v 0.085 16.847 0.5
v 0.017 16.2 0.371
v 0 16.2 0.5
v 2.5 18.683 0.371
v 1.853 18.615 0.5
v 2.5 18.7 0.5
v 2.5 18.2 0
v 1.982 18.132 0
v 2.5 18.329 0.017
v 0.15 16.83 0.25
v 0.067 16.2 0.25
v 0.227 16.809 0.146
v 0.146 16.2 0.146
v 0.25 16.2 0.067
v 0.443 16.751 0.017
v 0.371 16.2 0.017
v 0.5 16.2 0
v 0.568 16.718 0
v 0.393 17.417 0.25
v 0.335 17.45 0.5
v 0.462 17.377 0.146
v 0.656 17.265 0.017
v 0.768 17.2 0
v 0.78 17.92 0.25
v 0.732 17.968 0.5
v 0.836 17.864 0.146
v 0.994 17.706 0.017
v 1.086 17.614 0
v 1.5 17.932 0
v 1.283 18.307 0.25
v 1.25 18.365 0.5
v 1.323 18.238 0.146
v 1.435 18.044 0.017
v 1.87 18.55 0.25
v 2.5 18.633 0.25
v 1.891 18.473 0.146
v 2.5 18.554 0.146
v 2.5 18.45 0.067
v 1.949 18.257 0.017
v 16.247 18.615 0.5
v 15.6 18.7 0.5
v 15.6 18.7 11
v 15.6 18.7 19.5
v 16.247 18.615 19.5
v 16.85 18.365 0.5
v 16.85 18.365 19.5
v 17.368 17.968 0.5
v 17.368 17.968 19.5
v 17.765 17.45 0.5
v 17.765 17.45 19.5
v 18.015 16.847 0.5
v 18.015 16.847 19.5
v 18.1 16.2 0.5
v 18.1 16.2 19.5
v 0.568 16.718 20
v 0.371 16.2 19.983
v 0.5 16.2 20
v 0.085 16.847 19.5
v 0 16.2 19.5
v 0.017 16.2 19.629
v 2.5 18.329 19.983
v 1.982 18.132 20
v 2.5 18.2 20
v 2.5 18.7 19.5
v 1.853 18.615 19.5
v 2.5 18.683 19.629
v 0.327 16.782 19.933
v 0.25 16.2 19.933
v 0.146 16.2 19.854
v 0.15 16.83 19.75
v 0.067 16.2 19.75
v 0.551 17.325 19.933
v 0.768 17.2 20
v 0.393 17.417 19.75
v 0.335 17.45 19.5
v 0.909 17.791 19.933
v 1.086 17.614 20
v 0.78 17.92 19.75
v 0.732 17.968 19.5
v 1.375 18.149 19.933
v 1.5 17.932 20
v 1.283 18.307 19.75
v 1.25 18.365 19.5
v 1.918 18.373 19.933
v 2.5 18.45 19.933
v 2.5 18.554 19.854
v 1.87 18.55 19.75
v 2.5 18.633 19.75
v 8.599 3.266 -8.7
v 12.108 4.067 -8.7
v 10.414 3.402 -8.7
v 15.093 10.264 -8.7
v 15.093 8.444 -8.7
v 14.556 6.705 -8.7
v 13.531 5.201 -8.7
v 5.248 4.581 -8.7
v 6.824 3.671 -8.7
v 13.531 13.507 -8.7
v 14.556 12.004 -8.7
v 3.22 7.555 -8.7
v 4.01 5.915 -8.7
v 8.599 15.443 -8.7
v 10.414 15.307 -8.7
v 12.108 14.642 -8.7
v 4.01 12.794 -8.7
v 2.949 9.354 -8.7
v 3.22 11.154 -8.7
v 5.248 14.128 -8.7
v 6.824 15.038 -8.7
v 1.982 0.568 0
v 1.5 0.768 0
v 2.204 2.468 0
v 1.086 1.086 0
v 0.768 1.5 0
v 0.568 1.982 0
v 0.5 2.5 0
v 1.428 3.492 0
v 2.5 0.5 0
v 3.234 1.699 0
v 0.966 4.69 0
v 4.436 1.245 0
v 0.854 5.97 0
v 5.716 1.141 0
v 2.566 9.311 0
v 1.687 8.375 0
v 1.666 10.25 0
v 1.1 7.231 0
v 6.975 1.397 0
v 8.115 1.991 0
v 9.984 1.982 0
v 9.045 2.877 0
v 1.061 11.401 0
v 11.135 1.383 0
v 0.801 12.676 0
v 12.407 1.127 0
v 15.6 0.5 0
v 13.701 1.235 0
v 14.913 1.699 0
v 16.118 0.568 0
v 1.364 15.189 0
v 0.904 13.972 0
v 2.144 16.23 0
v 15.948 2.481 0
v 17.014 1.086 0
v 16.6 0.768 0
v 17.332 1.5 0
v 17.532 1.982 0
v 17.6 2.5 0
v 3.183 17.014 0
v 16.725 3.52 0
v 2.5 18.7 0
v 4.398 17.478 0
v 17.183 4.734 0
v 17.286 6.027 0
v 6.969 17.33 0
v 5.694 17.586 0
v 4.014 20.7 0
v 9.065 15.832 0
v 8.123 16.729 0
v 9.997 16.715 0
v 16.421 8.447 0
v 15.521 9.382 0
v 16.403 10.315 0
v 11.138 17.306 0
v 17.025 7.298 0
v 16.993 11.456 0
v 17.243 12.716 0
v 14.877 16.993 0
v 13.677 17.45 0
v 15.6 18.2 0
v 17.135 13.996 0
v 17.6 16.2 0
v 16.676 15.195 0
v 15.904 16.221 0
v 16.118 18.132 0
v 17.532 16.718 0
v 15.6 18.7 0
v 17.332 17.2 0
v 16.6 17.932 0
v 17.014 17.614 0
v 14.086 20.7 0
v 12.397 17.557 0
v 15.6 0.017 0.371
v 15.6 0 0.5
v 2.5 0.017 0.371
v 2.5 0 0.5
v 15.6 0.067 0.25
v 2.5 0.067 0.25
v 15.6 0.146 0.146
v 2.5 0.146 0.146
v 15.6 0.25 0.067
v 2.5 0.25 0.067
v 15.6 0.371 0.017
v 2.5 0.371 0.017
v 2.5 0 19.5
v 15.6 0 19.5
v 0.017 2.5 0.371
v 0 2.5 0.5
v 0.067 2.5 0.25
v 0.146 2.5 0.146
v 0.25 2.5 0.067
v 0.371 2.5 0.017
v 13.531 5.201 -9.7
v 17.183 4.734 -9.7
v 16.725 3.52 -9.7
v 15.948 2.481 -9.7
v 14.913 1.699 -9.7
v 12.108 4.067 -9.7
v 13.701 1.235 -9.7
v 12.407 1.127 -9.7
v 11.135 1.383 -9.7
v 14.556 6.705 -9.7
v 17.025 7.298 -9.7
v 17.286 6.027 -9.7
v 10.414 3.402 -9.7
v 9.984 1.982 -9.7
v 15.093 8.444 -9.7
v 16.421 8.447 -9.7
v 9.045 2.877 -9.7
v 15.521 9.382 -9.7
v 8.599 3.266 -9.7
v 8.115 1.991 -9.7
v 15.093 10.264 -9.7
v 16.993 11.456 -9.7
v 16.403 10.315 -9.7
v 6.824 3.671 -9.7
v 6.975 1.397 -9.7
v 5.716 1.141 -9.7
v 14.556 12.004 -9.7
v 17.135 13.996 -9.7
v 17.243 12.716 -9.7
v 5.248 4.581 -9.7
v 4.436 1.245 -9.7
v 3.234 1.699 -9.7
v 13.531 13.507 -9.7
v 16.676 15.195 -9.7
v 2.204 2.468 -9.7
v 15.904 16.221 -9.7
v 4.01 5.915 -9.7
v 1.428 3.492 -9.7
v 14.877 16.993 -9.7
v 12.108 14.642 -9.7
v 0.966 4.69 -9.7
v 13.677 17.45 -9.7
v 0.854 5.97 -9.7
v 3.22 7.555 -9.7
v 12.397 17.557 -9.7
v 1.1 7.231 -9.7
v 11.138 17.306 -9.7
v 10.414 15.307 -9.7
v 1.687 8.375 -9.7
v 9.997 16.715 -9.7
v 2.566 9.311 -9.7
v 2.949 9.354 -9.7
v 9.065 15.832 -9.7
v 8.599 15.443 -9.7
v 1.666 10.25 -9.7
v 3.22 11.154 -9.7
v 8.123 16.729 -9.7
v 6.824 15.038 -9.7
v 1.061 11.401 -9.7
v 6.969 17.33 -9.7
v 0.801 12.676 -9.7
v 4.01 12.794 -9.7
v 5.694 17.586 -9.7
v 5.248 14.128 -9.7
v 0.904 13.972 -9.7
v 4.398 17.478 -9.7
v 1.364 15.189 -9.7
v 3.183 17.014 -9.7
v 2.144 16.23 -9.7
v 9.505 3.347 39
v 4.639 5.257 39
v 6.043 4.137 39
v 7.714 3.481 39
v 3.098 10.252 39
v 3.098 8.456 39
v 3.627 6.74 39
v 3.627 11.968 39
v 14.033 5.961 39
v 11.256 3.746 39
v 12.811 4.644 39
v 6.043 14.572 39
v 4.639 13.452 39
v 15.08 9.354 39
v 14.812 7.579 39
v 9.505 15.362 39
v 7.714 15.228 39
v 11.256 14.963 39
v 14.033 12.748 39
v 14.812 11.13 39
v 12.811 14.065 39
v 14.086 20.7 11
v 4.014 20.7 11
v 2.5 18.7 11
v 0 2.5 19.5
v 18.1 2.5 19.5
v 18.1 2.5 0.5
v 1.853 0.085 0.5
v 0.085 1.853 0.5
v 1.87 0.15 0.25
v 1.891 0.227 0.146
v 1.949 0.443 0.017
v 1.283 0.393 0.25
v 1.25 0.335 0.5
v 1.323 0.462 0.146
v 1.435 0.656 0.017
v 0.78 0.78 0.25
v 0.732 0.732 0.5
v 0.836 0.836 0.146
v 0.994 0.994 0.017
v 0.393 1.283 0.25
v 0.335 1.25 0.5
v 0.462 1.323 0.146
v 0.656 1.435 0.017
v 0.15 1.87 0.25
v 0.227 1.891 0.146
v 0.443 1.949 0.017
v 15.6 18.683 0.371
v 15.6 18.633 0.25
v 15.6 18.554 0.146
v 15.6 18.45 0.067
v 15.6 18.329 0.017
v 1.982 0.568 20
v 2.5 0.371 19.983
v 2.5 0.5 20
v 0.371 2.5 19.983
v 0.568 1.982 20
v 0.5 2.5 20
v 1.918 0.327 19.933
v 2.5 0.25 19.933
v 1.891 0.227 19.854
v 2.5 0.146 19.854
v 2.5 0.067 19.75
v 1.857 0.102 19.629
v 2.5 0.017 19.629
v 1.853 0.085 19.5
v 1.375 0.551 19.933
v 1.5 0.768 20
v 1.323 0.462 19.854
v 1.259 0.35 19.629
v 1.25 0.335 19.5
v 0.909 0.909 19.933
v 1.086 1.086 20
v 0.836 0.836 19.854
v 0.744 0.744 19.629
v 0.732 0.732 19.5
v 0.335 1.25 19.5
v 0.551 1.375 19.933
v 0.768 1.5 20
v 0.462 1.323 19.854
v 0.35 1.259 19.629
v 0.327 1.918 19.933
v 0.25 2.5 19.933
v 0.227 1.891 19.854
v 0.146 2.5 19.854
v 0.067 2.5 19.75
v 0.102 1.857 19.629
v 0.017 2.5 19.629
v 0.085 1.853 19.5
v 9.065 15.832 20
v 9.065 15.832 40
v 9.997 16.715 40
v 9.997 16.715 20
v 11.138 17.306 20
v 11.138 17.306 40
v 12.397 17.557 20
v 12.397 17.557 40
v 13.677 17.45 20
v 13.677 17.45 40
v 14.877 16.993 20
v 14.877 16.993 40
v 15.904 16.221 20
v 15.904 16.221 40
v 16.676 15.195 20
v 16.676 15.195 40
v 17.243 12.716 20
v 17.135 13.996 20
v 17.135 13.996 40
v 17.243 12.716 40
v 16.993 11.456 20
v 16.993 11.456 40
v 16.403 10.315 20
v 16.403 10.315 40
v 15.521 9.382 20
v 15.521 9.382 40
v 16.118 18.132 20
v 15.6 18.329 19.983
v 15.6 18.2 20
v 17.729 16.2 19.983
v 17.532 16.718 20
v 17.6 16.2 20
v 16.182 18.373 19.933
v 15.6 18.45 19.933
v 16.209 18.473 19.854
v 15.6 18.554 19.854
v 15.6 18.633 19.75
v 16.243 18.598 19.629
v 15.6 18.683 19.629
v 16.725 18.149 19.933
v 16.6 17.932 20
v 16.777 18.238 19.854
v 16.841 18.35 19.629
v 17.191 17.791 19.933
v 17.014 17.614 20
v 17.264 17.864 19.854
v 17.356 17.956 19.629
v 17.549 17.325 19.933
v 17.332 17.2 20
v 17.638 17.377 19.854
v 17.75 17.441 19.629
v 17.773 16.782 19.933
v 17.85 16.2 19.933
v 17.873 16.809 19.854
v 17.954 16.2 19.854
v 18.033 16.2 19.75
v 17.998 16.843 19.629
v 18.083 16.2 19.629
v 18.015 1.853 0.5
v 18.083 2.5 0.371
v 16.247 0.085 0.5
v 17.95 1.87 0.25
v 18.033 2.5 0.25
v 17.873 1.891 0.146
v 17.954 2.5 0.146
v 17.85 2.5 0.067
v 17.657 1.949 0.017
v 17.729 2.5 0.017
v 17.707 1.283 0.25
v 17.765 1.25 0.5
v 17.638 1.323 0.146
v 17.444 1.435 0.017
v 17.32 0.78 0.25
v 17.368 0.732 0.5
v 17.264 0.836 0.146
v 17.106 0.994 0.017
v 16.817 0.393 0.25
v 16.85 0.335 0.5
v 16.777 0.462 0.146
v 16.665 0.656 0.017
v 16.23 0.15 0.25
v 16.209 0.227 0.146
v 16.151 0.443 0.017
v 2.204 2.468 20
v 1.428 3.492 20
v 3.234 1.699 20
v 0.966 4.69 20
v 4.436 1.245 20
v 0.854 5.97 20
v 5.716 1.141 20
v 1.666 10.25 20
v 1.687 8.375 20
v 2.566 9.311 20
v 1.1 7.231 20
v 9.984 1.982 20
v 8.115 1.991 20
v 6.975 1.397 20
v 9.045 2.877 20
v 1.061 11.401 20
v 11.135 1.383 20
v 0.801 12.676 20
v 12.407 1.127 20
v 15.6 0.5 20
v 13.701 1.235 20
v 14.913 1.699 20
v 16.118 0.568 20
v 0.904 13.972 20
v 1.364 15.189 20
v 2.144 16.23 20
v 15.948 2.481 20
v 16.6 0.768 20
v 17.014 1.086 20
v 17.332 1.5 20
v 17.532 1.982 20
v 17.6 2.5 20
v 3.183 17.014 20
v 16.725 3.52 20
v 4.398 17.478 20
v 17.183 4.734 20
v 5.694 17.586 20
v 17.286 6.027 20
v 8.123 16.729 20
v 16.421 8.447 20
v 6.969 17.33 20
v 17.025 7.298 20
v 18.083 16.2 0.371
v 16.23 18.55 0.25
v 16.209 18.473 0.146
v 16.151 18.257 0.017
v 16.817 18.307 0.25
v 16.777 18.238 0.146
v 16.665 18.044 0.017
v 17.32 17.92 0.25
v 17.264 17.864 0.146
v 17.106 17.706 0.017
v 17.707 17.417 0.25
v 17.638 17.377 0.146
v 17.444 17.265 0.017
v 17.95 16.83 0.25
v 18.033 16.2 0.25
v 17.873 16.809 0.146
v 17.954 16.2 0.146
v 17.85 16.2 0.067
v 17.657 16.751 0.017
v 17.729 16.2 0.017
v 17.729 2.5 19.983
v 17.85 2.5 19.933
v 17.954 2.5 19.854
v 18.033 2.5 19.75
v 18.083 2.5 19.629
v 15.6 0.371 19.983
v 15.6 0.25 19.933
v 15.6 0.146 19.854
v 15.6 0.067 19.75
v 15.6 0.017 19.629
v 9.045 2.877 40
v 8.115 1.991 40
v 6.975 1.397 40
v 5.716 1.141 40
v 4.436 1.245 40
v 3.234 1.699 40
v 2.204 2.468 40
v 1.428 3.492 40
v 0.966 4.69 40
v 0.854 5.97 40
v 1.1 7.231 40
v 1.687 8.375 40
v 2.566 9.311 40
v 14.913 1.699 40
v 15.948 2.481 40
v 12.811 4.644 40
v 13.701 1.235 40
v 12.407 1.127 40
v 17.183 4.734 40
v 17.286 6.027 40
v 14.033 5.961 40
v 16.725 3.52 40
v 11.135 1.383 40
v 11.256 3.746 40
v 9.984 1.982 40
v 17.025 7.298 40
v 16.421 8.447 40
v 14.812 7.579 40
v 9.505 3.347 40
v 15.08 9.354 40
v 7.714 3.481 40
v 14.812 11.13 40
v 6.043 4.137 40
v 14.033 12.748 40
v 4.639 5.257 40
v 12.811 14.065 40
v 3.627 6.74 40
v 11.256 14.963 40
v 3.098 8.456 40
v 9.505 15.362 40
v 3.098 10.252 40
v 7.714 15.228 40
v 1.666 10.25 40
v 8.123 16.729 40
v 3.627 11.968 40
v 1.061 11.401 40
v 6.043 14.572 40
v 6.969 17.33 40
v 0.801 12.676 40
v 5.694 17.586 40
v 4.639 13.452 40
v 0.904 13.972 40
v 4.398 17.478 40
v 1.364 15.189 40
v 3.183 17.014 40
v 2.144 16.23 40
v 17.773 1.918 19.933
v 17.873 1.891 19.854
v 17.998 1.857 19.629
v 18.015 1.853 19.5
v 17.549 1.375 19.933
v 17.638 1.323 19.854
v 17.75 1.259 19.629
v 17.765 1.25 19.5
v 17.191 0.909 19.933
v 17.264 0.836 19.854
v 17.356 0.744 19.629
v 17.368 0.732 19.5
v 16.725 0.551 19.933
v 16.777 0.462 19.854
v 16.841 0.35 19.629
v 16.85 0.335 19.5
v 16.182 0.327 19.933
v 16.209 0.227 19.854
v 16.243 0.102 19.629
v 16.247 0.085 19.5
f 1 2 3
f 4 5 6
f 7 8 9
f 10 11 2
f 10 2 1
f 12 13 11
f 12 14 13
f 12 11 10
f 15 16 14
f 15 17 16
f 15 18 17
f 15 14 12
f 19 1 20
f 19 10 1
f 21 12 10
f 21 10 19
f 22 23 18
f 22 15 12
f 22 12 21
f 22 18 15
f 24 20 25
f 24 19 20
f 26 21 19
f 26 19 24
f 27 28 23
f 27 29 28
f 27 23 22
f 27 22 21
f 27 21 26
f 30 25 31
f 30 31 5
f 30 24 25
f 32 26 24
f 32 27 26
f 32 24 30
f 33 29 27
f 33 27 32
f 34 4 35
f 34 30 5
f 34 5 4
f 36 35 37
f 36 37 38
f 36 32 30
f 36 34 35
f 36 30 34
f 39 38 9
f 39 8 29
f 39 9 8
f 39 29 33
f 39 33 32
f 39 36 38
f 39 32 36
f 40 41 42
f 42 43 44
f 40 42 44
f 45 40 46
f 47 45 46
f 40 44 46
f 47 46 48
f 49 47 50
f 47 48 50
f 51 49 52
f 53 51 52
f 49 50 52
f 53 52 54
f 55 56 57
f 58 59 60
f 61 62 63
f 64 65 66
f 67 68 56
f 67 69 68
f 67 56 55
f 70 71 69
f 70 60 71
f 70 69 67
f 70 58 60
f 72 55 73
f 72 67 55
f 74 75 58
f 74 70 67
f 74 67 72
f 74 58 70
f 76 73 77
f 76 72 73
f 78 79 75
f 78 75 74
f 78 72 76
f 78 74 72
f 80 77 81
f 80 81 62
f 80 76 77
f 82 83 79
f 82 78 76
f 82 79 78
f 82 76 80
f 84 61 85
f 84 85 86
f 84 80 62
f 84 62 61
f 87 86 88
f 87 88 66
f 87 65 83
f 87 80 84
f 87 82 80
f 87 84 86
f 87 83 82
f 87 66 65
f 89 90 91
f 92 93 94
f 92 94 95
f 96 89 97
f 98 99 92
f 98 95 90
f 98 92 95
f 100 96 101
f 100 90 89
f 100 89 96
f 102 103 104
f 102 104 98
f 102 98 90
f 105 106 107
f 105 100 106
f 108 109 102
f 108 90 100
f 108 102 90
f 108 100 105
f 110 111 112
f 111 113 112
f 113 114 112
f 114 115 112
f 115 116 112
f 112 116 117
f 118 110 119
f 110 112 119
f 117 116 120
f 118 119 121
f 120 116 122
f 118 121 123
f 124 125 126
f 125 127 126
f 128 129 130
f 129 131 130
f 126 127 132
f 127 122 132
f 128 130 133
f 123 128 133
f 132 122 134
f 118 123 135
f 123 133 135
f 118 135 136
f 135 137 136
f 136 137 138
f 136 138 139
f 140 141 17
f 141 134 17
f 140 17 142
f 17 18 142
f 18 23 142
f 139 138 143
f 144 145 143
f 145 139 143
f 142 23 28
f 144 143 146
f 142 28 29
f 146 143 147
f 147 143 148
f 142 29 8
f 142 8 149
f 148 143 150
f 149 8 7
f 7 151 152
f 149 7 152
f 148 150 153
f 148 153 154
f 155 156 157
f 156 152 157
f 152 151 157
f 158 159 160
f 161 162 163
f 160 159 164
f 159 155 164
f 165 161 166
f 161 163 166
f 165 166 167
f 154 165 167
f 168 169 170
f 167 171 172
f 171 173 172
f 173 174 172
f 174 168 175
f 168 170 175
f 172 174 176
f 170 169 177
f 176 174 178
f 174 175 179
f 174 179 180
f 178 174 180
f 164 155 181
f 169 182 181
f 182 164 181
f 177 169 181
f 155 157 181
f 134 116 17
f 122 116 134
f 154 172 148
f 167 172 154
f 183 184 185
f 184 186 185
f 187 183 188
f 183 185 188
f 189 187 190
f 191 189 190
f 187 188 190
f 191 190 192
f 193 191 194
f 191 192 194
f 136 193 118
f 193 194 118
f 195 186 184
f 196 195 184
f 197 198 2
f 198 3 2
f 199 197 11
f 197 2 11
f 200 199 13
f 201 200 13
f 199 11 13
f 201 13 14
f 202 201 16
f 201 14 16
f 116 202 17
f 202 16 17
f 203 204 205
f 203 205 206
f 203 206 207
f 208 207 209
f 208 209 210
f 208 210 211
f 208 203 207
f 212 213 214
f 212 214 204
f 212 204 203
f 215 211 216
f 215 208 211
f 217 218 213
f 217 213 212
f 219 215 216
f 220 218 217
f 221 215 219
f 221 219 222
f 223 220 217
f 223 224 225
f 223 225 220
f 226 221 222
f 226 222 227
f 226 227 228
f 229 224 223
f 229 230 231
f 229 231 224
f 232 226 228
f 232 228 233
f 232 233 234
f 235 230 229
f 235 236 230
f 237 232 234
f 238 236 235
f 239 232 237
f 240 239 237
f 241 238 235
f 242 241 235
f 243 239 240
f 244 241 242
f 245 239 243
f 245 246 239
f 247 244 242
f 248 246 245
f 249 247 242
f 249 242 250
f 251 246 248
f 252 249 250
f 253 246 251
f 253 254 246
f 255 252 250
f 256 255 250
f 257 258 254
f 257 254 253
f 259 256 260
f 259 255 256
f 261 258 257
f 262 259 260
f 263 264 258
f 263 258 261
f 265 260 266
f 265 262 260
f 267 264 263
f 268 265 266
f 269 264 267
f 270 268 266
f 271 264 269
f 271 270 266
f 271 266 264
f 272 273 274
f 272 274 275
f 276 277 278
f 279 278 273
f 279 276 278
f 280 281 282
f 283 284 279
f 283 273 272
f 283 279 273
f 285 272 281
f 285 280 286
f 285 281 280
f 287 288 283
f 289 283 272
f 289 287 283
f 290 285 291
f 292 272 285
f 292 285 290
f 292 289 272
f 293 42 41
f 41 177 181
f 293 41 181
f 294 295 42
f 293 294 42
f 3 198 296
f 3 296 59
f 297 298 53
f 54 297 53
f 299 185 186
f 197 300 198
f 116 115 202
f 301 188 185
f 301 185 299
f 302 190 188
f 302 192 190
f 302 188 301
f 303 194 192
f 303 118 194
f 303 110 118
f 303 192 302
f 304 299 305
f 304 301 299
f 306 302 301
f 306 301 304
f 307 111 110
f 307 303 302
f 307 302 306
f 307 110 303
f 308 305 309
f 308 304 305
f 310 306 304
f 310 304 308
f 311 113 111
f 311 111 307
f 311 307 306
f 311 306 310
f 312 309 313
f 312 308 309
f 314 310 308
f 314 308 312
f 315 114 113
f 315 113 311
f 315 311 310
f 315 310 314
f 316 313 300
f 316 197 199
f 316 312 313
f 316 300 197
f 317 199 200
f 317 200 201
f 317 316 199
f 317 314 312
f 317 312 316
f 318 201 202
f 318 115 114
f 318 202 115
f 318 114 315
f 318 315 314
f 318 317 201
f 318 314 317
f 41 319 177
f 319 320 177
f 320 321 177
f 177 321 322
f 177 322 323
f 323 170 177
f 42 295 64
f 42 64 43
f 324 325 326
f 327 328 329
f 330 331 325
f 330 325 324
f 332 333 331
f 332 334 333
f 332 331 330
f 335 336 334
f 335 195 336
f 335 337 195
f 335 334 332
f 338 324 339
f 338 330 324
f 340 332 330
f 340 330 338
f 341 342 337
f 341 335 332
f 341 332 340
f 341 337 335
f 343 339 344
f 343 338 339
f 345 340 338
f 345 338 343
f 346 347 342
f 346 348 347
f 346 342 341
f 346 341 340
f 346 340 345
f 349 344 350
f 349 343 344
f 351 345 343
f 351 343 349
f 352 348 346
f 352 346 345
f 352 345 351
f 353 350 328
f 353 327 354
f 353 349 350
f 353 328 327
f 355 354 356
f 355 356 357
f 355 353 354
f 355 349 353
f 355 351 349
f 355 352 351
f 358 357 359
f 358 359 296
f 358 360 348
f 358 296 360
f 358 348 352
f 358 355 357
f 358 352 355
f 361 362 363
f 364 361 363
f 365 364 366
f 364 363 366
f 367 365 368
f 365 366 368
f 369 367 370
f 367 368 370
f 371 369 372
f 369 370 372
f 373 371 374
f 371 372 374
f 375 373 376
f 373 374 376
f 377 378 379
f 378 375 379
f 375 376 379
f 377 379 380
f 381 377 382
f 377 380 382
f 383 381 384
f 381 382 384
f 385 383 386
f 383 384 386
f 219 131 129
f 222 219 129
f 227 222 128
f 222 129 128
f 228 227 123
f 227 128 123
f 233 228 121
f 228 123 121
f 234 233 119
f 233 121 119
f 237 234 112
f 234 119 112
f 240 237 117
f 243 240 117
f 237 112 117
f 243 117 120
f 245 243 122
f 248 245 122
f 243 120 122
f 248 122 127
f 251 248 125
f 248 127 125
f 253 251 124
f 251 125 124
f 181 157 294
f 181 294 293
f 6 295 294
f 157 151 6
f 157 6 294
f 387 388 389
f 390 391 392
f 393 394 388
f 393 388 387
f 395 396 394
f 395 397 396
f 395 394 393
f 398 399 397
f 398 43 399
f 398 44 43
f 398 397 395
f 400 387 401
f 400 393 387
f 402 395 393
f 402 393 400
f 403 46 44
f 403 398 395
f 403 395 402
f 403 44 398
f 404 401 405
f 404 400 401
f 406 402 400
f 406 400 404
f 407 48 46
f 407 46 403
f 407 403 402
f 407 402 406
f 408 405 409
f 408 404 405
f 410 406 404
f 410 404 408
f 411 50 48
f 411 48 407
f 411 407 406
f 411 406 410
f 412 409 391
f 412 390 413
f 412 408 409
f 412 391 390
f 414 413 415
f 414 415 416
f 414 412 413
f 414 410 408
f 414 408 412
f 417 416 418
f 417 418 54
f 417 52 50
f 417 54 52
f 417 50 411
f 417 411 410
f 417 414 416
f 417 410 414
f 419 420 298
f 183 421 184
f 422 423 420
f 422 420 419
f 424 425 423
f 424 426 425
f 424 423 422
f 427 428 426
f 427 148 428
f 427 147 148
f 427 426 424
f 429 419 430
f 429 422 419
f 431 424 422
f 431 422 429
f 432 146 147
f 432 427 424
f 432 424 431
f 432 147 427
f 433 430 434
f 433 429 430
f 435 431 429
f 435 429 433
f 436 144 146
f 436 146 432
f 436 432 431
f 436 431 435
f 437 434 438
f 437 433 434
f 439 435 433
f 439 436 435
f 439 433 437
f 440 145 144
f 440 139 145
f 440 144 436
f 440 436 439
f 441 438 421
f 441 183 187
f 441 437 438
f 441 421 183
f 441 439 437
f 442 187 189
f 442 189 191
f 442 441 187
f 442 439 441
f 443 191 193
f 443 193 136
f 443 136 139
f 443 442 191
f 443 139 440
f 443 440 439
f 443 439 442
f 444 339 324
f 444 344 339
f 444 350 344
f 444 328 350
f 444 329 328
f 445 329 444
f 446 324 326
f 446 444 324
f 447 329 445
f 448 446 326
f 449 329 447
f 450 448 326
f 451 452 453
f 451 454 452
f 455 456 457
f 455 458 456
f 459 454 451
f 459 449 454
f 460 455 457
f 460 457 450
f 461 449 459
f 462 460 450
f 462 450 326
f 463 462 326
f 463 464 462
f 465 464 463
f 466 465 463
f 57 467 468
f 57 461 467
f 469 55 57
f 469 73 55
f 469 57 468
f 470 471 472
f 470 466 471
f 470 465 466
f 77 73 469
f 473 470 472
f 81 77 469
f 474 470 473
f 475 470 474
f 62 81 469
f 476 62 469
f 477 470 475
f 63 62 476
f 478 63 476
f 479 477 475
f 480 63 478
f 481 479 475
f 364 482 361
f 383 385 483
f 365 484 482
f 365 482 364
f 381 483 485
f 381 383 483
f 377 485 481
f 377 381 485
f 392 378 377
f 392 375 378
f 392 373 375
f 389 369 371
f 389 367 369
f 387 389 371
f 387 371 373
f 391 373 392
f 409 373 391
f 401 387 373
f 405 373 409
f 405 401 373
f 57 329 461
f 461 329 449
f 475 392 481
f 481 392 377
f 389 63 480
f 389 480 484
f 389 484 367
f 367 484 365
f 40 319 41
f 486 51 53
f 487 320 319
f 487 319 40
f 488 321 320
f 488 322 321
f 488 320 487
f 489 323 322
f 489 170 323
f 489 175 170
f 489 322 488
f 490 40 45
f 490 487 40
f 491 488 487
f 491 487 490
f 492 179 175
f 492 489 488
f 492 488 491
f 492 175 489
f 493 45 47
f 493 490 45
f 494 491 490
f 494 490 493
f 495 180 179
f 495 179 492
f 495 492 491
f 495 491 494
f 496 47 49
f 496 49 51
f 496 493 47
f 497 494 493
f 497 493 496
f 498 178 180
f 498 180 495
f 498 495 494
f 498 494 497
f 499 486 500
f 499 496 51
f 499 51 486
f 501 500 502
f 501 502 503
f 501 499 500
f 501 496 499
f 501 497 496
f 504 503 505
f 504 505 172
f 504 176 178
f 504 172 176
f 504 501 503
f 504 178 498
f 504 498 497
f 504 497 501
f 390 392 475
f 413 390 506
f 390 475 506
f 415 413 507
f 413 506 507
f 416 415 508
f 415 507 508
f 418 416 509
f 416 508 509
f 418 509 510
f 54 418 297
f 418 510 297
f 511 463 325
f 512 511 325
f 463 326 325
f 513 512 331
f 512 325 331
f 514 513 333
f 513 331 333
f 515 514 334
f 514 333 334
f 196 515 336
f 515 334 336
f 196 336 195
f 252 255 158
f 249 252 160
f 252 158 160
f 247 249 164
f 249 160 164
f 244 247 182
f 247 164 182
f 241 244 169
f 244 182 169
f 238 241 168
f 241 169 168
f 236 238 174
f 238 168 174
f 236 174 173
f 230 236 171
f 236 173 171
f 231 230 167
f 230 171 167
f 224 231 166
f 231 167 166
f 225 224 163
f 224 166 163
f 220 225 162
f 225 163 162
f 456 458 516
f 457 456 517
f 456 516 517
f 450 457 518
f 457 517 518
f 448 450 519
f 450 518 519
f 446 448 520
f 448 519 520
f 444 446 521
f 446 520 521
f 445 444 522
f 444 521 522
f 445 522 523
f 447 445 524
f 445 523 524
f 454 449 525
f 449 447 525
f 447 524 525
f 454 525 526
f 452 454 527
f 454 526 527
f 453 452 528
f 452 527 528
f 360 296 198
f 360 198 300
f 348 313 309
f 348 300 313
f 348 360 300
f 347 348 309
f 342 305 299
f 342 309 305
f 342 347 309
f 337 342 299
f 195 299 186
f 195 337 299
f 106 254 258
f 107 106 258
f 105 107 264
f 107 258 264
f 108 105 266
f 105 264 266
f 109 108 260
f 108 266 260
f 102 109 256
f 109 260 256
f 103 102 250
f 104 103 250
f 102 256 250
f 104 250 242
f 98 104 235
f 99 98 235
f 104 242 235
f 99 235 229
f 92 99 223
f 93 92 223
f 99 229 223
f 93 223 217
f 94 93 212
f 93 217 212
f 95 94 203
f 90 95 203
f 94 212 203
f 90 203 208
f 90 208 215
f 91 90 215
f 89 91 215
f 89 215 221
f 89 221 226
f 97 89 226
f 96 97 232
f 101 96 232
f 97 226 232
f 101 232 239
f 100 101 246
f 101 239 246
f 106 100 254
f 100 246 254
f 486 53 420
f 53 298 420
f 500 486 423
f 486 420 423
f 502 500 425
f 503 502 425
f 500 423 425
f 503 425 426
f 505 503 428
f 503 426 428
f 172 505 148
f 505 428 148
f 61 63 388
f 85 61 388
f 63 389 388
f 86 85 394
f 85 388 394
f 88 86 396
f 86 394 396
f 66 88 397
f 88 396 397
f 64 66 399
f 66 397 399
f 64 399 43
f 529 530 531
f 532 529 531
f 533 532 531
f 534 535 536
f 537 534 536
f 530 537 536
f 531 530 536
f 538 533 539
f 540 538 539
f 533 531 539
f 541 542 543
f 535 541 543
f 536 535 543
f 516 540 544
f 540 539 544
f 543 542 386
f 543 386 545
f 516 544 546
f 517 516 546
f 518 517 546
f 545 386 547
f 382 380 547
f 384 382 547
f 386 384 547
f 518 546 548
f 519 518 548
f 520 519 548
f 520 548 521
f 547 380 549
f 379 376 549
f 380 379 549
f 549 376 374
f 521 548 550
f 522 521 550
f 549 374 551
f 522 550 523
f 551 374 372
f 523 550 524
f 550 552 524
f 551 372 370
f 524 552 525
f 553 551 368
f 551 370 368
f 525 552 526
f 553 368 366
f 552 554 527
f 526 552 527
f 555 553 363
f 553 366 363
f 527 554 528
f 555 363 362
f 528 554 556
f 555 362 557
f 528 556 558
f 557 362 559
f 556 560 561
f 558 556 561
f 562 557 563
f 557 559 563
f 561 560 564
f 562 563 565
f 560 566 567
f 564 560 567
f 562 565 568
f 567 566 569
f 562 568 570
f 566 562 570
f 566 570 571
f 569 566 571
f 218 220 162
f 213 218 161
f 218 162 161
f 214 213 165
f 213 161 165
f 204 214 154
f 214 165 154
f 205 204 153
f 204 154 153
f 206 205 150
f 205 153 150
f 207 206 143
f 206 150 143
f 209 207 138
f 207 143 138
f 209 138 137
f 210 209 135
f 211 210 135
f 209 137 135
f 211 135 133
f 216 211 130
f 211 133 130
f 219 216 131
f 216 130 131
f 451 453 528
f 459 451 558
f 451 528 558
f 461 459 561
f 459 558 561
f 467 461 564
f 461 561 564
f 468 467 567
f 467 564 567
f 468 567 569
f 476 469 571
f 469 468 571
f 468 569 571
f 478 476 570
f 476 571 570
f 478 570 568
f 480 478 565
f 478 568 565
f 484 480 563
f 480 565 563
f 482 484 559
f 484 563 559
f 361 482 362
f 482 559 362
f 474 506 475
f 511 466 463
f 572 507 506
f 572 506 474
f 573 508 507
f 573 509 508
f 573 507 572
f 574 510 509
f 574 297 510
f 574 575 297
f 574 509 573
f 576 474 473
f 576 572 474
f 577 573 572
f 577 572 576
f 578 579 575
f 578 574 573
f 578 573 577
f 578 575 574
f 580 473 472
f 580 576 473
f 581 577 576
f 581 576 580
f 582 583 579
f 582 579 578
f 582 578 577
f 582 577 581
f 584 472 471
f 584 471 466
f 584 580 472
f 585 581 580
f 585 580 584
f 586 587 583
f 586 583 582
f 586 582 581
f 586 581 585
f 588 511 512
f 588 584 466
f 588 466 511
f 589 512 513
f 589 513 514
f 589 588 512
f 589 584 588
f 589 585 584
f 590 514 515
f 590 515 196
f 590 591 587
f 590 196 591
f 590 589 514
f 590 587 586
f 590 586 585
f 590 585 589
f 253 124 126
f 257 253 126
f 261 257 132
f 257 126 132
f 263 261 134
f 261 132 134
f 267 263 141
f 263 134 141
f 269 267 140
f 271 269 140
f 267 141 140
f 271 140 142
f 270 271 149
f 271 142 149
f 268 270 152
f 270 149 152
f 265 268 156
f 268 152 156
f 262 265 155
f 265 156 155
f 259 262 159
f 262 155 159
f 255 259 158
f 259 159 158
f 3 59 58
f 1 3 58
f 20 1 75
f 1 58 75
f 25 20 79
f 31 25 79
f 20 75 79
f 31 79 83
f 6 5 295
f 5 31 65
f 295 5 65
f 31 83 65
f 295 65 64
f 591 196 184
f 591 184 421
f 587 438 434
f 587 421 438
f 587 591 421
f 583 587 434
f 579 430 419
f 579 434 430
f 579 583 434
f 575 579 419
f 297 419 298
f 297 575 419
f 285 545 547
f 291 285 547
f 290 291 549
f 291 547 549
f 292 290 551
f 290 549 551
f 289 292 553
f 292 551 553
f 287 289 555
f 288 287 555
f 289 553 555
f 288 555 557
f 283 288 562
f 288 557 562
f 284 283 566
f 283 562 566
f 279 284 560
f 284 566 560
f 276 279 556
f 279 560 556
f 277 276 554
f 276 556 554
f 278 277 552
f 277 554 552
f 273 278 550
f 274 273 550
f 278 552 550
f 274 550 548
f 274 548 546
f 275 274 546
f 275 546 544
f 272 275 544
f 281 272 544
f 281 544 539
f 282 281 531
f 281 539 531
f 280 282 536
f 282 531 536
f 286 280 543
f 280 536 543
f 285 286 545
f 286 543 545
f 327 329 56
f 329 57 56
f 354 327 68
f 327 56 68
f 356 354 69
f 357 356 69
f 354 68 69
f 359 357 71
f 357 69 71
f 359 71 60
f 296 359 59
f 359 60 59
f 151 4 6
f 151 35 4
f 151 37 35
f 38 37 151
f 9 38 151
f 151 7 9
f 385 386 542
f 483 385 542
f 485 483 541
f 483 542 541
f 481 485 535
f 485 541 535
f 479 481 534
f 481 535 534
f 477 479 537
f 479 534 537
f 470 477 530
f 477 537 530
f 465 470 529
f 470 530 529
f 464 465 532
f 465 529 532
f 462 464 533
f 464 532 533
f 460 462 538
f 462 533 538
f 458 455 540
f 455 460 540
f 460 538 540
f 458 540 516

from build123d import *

# Parameters (mm, degrees)
SKETCH_1_W           = 18.1
SKETCH_1_H           = 18.7
EXTRUDE_1_DEPTH      = 20
SKETCH_2_W           = 13.1
SKETCH_2_H           = 11
EXTRUDE_2_DEPTH      = 2
EXTRUDE_3_DEPTH      = 9.7
EXTRUDE_3_DEPTH_BACK = 40
FILLET_1_R           = 2.5
FILLET_2_R           = 0.5
CUT_EXTRUDE_1_DEPTH  = 49.539674531
SKETCH_5_R           = 6.105797263
CUT_EXTRUDE_2_DEPTH  = 1
SKETCH_6_R           = 6.02468661
CUT_EXTRUDE_3_DEPTH  = 1


with BuildPart() as part:
    # ｽｹｯﾁ1 → ﾎﾞｽ - 押し出し1 (new body)
    with BuildSketch(Plane.XY):
        with Locations((9.05, 9.35)):
            Rectangle(SKETCH_1_W, SKETCH_1_H)
    extrude(amount=EXTRUDE_1_DEPTH)

    # ｽｹｯﾁ2 → ﾎﾞｽ - 押し出し2 (add)
    with BuildSketch(Plane(origin=(0, 18.7, 0), x_dir=(1, 0, 0), z_dir=(0, 1, 0))):
        with Locations((9.05, -5.5)):
            Rectangle(SKETCH_2_W, SKETCH_2_H)
    extrude(amount=EXTRUDE_2_DEPTH)

    # ｽｹｯﾁ3 → ﾎﾞｽ - 押し出し3 (add, two sides: drawn at the far end of the back side and taken through both)
    with BuildSketch(Plane(origin=(0, 0, 0), x_dir=(-1, 0, 0), z_dir=(0, 0, -1)).offset(-EXTRUDE_3_DEPTH_BACK)):
        with BuildLine():
            ThreePointArc((-2.566319039, 9.311012343), (-2.144244303, 16.230296479), (-9.064933475, 15.831923002))
            ThreePointArc((-9.064933475, 15.831923002), (-15.903655717, 16.221032622), (-15.521168651, 9.381936787))
            ThreePointArc((-15.521168651, 9.381936787), (-15.948030787, 2.480748206), (-9.045010779, 2.876891972))
            ThreePointArc((-9.045010779, 2.876891972), (-2.204371262, 2.467711109), (-2.566319039, 9.311012343))
        make_face()
    extrude(amount=EXTRUDE_3_DEPTH + EXTRUDE_3_DEPTH_BACK)

    # ﾌｨﾚｯﾄ1
    fillet_1_edges = [part.edges().sort_by_distance(p)[0] for p in [
        (0, 0, 10),
        (18.1, 0, 10),
        (18.1, 18.7, 10),
        (0, 18.7, 10),
    ]]
    fillet(fillet_1_edges, radius=FILLET_1_R)

    # ﾌｨﾚｯﾄ2
    fillet_2_edges = [part.edges().sort_by_distance(p)[0] for p in [
        (0.732233047, 17.967766953, 20),
        (9.05, 18.7, 20),
        (17.367766953, 17.967766953, 20),
        (18.1, 9.35, 20),
        (17.367766953, 0.732233047, 20),
        (9.05, 0, 20),
        (0.732233047, 0.732233047, 20),
        (17.367766953, 17.967766953, 0),
        (18.1, 9.35, 0),
        (17.367766953, 0.732233047, 0),
        (9.05, 0, 0),
        (0.732233047, 0.732233047, 0),
        (0, 9.35, 0),
        (0, 9.35, 20),
        (0.732233047, 17.967766953, 0),
    ]]
    fillet(fillet_2_edges, radius=FILLET_2_R)

    # ｽｹｯﾁ4 → ｶｯﾄ - 押し出し1 (cut, through all)
    with BuildSketch(Plane(origin=(0, 0, 0), x_dir=(-1, 0, 0), z_dir=(0, 0, -1))):
        Polygon((-15.6, 18.7), (-14.085876612, 20.7), (-15.6, 20.7), align=None)
        Polygon((-2.5, 20.7), (-2.5, 18.7), (-4.014123388, 20.7), align=None)
    extrude(amount=-CUT_EXTRUDE_1_DEPTH, mode=Mode.SUBTRACT)

    # ｽｹｯﾁ5 → ｶｯﾄ - 押し出し2 (cut)
    with BuildSketch(Plane(origin=(0, 0, -9.7), x_dir=(-1, 0, 0), z_dir=(0, 0, -1))):
        with Locations((-9.054972127, 9.354407487)):
            Circle(SKETCH_5_R)
    extrude(amount=-CUT_EXTRUDE_2_DEPTH, mode=Mode.SUBTRACT)

    # ｽｹｯﾁ6 → ｶｯﾄ - 押し出し3 (cut)
    with BuildSketch(Plane.XY.offset(40)):
        with Locations((9.054972127, 9.354407487)):
            Circle(SKETCH_6_R)
    extrude(amount=-CUT_EXTRUDE_3_DEPTH, mode=Mode.SUBTRACT)


solid = part.part
